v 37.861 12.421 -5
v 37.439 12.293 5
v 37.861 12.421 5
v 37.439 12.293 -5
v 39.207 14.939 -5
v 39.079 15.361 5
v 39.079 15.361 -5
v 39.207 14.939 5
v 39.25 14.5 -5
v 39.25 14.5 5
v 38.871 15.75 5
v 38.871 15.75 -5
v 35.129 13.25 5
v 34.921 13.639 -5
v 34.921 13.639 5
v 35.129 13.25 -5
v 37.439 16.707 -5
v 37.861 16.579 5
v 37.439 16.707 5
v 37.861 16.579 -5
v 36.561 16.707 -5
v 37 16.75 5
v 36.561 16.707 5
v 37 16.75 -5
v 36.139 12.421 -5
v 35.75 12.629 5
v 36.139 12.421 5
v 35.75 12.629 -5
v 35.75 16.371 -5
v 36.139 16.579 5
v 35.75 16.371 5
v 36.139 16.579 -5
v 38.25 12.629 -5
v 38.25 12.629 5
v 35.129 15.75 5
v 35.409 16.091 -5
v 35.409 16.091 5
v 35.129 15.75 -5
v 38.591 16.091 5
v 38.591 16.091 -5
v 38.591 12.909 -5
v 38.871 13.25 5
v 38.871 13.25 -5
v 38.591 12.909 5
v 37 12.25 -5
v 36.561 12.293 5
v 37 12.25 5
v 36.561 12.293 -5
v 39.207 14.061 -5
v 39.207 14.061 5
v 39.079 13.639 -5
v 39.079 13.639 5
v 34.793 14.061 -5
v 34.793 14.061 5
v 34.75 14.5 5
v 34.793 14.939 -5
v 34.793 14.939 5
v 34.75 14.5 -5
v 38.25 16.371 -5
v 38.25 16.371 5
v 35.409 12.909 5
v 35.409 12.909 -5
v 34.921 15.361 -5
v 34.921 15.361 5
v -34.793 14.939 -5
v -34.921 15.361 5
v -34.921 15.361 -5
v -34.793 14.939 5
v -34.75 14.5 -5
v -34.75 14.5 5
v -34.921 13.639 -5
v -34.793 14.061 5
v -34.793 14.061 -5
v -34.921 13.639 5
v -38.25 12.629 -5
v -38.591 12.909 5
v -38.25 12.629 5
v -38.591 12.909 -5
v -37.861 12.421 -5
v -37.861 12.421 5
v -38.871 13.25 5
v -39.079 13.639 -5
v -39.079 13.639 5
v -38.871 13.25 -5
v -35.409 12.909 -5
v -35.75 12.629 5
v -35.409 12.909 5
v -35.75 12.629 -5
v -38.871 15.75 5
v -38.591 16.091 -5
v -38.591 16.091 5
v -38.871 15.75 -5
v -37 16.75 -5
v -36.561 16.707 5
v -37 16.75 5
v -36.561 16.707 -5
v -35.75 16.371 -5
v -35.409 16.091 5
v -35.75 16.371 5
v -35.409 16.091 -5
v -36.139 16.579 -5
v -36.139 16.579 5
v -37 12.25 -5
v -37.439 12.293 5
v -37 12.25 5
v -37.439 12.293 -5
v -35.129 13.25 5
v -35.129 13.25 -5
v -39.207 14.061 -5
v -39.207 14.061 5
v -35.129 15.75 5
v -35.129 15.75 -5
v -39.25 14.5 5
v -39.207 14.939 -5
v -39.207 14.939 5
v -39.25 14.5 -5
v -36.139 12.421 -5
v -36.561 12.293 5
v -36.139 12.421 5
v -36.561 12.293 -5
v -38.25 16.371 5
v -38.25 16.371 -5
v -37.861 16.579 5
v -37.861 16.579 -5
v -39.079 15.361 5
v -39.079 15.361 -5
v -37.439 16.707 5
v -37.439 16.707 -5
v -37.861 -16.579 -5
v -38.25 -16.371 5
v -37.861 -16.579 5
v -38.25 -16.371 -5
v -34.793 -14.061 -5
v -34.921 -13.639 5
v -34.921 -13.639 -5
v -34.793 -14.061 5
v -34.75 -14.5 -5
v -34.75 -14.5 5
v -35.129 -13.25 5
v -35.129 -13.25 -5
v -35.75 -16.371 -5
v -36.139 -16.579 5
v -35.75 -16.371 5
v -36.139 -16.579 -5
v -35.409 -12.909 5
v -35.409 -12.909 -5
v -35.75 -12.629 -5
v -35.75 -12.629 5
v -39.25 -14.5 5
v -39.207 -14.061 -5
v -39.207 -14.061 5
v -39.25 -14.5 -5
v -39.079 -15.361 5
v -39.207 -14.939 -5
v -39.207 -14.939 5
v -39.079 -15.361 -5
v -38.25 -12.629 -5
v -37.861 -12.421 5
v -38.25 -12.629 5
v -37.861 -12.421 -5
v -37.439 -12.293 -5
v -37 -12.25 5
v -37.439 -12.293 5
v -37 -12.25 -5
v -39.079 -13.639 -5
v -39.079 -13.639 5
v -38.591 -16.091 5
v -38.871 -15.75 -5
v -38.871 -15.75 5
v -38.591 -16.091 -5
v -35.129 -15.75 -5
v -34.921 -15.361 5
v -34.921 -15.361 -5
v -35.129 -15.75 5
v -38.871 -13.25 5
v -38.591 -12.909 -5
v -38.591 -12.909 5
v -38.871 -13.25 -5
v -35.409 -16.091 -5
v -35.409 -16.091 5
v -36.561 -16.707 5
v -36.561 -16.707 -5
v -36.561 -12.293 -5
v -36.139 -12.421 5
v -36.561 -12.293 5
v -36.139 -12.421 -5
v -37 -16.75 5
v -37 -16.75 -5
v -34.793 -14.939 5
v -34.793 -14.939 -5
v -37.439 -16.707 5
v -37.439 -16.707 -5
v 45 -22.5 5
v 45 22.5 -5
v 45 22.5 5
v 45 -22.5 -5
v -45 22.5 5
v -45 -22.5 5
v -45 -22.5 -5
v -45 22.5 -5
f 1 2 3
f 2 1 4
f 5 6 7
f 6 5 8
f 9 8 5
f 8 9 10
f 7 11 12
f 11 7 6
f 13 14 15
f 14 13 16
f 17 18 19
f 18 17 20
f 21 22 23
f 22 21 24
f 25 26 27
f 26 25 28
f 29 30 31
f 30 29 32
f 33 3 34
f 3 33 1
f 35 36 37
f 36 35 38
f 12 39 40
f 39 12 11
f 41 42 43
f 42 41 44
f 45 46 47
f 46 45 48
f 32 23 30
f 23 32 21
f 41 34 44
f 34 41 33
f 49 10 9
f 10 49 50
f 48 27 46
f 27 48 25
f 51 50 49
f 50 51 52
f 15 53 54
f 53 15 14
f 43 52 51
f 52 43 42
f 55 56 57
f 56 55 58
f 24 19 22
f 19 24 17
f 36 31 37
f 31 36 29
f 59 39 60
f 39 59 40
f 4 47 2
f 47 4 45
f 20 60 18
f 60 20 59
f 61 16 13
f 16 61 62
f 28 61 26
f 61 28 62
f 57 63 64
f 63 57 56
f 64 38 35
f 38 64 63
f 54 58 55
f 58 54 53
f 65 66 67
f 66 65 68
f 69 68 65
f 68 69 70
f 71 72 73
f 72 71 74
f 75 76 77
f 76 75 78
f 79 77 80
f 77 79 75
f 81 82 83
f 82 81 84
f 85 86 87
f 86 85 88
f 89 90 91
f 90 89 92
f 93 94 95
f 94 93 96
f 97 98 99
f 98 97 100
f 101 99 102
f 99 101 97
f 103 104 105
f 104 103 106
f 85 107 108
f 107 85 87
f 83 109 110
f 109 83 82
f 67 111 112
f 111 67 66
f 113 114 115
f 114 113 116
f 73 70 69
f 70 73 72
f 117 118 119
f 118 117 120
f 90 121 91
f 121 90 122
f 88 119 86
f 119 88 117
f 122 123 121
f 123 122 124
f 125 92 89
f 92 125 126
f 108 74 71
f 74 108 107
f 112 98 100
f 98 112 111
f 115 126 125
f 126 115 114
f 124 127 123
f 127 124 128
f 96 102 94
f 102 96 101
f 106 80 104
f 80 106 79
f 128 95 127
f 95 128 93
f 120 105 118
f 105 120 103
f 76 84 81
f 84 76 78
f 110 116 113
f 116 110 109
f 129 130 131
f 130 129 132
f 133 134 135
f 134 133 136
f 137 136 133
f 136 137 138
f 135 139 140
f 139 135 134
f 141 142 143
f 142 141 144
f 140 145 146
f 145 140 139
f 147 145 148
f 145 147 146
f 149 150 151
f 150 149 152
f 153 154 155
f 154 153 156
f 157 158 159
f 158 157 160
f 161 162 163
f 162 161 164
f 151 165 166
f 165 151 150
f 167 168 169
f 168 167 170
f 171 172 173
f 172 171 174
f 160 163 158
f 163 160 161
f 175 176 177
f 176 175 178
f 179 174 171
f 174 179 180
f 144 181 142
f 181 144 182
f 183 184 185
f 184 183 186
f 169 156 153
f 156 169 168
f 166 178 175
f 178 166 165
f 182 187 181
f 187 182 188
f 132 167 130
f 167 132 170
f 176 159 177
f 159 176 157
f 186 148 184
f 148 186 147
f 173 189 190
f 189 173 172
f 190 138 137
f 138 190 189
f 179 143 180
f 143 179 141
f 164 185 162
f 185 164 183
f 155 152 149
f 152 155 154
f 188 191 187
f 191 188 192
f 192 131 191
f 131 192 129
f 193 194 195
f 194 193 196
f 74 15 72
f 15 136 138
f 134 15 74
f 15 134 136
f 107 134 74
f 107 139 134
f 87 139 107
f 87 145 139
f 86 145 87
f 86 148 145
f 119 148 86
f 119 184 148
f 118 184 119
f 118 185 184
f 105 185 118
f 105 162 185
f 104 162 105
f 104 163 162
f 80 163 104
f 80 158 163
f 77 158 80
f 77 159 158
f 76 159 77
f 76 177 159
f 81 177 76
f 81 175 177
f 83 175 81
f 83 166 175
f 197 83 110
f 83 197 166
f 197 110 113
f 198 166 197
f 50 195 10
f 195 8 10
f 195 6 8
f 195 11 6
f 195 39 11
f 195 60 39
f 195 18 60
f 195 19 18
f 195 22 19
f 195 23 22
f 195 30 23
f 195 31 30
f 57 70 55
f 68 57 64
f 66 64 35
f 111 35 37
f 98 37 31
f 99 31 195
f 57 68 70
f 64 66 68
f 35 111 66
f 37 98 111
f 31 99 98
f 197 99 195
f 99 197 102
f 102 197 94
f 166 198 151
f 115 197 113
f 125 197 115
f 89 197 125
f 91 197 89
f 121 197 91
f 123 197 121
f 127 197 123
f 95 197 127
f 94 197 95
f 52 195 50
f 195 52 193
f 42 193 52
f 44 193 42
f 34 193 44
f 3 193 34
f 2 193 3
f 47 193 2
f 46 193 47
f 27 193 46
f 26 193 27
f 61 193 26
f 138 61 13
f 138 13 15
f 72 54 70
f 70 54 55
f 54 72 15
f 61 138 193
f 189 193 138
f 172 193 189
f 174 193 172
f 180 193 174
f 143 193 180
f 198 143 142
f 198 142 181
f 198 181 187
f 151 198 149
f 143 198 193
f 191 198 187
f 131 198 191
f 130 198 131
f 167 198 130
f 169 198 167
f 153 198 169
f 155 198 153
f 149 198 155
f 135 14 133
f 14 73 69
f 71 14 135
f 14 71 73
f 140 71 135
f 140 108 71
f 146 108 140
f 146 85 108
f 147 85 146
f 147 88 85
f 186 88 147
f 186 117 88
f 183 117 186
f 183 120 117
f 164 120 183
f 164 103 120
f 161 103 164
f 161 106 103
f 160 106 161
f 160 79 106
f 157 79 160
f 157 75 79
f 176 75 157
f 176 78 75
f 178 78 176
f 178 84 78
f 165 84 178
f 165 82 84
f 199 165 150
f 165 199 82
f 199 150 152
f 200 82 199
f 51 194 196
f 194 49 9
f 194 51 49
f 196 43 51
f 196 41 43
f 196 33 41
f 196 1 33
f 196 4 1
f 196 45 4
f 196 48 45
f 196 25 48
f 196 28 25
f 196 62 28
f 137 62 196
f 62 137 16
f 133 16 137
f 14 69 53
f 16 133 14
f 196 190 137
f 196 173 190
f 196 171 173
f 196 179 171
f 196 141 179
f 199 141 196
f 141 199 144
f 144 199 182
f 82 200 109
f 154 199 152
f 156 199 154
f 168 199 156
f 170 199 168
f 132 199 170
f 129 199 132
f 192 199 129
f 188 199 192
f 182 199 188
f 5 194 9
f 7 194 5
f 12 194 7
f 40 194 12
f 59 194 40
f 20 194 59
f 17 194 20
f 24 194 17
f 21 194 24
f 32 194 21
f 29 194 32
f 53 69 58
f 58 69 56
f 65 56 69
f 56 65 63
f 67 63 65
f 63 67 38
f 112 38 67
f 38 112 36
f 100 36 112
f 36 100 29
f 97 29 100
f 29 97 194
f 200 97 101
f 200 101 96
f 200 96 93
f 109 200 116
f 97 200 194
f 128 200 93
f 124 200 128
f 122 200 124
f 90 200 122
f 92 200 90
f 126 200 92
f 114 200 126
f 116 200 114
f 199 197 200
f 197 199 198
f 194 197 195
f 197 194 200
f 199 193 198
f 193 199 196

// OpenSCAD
$fn = 32;

// ----------------------------------------------------------------------
// Corner plate 90 x 45 x 10
// 3 holes, centres taken from the edge offset
// ----------------------------------------------------------------------

// --- parameters (mm) ---
plate = [90, 45, 10];  // overall size (x, y, z)
holes = 3;             // number of holes the drawing asks for
hole_d = 4.5;          // hole diameter
edge = 8;              // hole centre offset from the plate edge

// --- derived feature positions (mm) ---
corner_x = plate[0] / 2 - edge;  // = 37   corner hole X
corner_y = plate[1] / 2 - edge;  // = 14.5   corner hole Y
feature_centers = [
  [corner_x, corner_y],
  [-corner_x, corner_y],
  [-corner_x, -corner_y]
];   // hole centres the loop below drills

// plate outline, every hole drilled through with the same cutters
difference() {
  cube(plate, center = true);
  for (centre = feature_centers)
    translate([centre[0], centre[1], 0])
      cylinder(d = hole_d, h = plate[2] + 2, center = true);
}
